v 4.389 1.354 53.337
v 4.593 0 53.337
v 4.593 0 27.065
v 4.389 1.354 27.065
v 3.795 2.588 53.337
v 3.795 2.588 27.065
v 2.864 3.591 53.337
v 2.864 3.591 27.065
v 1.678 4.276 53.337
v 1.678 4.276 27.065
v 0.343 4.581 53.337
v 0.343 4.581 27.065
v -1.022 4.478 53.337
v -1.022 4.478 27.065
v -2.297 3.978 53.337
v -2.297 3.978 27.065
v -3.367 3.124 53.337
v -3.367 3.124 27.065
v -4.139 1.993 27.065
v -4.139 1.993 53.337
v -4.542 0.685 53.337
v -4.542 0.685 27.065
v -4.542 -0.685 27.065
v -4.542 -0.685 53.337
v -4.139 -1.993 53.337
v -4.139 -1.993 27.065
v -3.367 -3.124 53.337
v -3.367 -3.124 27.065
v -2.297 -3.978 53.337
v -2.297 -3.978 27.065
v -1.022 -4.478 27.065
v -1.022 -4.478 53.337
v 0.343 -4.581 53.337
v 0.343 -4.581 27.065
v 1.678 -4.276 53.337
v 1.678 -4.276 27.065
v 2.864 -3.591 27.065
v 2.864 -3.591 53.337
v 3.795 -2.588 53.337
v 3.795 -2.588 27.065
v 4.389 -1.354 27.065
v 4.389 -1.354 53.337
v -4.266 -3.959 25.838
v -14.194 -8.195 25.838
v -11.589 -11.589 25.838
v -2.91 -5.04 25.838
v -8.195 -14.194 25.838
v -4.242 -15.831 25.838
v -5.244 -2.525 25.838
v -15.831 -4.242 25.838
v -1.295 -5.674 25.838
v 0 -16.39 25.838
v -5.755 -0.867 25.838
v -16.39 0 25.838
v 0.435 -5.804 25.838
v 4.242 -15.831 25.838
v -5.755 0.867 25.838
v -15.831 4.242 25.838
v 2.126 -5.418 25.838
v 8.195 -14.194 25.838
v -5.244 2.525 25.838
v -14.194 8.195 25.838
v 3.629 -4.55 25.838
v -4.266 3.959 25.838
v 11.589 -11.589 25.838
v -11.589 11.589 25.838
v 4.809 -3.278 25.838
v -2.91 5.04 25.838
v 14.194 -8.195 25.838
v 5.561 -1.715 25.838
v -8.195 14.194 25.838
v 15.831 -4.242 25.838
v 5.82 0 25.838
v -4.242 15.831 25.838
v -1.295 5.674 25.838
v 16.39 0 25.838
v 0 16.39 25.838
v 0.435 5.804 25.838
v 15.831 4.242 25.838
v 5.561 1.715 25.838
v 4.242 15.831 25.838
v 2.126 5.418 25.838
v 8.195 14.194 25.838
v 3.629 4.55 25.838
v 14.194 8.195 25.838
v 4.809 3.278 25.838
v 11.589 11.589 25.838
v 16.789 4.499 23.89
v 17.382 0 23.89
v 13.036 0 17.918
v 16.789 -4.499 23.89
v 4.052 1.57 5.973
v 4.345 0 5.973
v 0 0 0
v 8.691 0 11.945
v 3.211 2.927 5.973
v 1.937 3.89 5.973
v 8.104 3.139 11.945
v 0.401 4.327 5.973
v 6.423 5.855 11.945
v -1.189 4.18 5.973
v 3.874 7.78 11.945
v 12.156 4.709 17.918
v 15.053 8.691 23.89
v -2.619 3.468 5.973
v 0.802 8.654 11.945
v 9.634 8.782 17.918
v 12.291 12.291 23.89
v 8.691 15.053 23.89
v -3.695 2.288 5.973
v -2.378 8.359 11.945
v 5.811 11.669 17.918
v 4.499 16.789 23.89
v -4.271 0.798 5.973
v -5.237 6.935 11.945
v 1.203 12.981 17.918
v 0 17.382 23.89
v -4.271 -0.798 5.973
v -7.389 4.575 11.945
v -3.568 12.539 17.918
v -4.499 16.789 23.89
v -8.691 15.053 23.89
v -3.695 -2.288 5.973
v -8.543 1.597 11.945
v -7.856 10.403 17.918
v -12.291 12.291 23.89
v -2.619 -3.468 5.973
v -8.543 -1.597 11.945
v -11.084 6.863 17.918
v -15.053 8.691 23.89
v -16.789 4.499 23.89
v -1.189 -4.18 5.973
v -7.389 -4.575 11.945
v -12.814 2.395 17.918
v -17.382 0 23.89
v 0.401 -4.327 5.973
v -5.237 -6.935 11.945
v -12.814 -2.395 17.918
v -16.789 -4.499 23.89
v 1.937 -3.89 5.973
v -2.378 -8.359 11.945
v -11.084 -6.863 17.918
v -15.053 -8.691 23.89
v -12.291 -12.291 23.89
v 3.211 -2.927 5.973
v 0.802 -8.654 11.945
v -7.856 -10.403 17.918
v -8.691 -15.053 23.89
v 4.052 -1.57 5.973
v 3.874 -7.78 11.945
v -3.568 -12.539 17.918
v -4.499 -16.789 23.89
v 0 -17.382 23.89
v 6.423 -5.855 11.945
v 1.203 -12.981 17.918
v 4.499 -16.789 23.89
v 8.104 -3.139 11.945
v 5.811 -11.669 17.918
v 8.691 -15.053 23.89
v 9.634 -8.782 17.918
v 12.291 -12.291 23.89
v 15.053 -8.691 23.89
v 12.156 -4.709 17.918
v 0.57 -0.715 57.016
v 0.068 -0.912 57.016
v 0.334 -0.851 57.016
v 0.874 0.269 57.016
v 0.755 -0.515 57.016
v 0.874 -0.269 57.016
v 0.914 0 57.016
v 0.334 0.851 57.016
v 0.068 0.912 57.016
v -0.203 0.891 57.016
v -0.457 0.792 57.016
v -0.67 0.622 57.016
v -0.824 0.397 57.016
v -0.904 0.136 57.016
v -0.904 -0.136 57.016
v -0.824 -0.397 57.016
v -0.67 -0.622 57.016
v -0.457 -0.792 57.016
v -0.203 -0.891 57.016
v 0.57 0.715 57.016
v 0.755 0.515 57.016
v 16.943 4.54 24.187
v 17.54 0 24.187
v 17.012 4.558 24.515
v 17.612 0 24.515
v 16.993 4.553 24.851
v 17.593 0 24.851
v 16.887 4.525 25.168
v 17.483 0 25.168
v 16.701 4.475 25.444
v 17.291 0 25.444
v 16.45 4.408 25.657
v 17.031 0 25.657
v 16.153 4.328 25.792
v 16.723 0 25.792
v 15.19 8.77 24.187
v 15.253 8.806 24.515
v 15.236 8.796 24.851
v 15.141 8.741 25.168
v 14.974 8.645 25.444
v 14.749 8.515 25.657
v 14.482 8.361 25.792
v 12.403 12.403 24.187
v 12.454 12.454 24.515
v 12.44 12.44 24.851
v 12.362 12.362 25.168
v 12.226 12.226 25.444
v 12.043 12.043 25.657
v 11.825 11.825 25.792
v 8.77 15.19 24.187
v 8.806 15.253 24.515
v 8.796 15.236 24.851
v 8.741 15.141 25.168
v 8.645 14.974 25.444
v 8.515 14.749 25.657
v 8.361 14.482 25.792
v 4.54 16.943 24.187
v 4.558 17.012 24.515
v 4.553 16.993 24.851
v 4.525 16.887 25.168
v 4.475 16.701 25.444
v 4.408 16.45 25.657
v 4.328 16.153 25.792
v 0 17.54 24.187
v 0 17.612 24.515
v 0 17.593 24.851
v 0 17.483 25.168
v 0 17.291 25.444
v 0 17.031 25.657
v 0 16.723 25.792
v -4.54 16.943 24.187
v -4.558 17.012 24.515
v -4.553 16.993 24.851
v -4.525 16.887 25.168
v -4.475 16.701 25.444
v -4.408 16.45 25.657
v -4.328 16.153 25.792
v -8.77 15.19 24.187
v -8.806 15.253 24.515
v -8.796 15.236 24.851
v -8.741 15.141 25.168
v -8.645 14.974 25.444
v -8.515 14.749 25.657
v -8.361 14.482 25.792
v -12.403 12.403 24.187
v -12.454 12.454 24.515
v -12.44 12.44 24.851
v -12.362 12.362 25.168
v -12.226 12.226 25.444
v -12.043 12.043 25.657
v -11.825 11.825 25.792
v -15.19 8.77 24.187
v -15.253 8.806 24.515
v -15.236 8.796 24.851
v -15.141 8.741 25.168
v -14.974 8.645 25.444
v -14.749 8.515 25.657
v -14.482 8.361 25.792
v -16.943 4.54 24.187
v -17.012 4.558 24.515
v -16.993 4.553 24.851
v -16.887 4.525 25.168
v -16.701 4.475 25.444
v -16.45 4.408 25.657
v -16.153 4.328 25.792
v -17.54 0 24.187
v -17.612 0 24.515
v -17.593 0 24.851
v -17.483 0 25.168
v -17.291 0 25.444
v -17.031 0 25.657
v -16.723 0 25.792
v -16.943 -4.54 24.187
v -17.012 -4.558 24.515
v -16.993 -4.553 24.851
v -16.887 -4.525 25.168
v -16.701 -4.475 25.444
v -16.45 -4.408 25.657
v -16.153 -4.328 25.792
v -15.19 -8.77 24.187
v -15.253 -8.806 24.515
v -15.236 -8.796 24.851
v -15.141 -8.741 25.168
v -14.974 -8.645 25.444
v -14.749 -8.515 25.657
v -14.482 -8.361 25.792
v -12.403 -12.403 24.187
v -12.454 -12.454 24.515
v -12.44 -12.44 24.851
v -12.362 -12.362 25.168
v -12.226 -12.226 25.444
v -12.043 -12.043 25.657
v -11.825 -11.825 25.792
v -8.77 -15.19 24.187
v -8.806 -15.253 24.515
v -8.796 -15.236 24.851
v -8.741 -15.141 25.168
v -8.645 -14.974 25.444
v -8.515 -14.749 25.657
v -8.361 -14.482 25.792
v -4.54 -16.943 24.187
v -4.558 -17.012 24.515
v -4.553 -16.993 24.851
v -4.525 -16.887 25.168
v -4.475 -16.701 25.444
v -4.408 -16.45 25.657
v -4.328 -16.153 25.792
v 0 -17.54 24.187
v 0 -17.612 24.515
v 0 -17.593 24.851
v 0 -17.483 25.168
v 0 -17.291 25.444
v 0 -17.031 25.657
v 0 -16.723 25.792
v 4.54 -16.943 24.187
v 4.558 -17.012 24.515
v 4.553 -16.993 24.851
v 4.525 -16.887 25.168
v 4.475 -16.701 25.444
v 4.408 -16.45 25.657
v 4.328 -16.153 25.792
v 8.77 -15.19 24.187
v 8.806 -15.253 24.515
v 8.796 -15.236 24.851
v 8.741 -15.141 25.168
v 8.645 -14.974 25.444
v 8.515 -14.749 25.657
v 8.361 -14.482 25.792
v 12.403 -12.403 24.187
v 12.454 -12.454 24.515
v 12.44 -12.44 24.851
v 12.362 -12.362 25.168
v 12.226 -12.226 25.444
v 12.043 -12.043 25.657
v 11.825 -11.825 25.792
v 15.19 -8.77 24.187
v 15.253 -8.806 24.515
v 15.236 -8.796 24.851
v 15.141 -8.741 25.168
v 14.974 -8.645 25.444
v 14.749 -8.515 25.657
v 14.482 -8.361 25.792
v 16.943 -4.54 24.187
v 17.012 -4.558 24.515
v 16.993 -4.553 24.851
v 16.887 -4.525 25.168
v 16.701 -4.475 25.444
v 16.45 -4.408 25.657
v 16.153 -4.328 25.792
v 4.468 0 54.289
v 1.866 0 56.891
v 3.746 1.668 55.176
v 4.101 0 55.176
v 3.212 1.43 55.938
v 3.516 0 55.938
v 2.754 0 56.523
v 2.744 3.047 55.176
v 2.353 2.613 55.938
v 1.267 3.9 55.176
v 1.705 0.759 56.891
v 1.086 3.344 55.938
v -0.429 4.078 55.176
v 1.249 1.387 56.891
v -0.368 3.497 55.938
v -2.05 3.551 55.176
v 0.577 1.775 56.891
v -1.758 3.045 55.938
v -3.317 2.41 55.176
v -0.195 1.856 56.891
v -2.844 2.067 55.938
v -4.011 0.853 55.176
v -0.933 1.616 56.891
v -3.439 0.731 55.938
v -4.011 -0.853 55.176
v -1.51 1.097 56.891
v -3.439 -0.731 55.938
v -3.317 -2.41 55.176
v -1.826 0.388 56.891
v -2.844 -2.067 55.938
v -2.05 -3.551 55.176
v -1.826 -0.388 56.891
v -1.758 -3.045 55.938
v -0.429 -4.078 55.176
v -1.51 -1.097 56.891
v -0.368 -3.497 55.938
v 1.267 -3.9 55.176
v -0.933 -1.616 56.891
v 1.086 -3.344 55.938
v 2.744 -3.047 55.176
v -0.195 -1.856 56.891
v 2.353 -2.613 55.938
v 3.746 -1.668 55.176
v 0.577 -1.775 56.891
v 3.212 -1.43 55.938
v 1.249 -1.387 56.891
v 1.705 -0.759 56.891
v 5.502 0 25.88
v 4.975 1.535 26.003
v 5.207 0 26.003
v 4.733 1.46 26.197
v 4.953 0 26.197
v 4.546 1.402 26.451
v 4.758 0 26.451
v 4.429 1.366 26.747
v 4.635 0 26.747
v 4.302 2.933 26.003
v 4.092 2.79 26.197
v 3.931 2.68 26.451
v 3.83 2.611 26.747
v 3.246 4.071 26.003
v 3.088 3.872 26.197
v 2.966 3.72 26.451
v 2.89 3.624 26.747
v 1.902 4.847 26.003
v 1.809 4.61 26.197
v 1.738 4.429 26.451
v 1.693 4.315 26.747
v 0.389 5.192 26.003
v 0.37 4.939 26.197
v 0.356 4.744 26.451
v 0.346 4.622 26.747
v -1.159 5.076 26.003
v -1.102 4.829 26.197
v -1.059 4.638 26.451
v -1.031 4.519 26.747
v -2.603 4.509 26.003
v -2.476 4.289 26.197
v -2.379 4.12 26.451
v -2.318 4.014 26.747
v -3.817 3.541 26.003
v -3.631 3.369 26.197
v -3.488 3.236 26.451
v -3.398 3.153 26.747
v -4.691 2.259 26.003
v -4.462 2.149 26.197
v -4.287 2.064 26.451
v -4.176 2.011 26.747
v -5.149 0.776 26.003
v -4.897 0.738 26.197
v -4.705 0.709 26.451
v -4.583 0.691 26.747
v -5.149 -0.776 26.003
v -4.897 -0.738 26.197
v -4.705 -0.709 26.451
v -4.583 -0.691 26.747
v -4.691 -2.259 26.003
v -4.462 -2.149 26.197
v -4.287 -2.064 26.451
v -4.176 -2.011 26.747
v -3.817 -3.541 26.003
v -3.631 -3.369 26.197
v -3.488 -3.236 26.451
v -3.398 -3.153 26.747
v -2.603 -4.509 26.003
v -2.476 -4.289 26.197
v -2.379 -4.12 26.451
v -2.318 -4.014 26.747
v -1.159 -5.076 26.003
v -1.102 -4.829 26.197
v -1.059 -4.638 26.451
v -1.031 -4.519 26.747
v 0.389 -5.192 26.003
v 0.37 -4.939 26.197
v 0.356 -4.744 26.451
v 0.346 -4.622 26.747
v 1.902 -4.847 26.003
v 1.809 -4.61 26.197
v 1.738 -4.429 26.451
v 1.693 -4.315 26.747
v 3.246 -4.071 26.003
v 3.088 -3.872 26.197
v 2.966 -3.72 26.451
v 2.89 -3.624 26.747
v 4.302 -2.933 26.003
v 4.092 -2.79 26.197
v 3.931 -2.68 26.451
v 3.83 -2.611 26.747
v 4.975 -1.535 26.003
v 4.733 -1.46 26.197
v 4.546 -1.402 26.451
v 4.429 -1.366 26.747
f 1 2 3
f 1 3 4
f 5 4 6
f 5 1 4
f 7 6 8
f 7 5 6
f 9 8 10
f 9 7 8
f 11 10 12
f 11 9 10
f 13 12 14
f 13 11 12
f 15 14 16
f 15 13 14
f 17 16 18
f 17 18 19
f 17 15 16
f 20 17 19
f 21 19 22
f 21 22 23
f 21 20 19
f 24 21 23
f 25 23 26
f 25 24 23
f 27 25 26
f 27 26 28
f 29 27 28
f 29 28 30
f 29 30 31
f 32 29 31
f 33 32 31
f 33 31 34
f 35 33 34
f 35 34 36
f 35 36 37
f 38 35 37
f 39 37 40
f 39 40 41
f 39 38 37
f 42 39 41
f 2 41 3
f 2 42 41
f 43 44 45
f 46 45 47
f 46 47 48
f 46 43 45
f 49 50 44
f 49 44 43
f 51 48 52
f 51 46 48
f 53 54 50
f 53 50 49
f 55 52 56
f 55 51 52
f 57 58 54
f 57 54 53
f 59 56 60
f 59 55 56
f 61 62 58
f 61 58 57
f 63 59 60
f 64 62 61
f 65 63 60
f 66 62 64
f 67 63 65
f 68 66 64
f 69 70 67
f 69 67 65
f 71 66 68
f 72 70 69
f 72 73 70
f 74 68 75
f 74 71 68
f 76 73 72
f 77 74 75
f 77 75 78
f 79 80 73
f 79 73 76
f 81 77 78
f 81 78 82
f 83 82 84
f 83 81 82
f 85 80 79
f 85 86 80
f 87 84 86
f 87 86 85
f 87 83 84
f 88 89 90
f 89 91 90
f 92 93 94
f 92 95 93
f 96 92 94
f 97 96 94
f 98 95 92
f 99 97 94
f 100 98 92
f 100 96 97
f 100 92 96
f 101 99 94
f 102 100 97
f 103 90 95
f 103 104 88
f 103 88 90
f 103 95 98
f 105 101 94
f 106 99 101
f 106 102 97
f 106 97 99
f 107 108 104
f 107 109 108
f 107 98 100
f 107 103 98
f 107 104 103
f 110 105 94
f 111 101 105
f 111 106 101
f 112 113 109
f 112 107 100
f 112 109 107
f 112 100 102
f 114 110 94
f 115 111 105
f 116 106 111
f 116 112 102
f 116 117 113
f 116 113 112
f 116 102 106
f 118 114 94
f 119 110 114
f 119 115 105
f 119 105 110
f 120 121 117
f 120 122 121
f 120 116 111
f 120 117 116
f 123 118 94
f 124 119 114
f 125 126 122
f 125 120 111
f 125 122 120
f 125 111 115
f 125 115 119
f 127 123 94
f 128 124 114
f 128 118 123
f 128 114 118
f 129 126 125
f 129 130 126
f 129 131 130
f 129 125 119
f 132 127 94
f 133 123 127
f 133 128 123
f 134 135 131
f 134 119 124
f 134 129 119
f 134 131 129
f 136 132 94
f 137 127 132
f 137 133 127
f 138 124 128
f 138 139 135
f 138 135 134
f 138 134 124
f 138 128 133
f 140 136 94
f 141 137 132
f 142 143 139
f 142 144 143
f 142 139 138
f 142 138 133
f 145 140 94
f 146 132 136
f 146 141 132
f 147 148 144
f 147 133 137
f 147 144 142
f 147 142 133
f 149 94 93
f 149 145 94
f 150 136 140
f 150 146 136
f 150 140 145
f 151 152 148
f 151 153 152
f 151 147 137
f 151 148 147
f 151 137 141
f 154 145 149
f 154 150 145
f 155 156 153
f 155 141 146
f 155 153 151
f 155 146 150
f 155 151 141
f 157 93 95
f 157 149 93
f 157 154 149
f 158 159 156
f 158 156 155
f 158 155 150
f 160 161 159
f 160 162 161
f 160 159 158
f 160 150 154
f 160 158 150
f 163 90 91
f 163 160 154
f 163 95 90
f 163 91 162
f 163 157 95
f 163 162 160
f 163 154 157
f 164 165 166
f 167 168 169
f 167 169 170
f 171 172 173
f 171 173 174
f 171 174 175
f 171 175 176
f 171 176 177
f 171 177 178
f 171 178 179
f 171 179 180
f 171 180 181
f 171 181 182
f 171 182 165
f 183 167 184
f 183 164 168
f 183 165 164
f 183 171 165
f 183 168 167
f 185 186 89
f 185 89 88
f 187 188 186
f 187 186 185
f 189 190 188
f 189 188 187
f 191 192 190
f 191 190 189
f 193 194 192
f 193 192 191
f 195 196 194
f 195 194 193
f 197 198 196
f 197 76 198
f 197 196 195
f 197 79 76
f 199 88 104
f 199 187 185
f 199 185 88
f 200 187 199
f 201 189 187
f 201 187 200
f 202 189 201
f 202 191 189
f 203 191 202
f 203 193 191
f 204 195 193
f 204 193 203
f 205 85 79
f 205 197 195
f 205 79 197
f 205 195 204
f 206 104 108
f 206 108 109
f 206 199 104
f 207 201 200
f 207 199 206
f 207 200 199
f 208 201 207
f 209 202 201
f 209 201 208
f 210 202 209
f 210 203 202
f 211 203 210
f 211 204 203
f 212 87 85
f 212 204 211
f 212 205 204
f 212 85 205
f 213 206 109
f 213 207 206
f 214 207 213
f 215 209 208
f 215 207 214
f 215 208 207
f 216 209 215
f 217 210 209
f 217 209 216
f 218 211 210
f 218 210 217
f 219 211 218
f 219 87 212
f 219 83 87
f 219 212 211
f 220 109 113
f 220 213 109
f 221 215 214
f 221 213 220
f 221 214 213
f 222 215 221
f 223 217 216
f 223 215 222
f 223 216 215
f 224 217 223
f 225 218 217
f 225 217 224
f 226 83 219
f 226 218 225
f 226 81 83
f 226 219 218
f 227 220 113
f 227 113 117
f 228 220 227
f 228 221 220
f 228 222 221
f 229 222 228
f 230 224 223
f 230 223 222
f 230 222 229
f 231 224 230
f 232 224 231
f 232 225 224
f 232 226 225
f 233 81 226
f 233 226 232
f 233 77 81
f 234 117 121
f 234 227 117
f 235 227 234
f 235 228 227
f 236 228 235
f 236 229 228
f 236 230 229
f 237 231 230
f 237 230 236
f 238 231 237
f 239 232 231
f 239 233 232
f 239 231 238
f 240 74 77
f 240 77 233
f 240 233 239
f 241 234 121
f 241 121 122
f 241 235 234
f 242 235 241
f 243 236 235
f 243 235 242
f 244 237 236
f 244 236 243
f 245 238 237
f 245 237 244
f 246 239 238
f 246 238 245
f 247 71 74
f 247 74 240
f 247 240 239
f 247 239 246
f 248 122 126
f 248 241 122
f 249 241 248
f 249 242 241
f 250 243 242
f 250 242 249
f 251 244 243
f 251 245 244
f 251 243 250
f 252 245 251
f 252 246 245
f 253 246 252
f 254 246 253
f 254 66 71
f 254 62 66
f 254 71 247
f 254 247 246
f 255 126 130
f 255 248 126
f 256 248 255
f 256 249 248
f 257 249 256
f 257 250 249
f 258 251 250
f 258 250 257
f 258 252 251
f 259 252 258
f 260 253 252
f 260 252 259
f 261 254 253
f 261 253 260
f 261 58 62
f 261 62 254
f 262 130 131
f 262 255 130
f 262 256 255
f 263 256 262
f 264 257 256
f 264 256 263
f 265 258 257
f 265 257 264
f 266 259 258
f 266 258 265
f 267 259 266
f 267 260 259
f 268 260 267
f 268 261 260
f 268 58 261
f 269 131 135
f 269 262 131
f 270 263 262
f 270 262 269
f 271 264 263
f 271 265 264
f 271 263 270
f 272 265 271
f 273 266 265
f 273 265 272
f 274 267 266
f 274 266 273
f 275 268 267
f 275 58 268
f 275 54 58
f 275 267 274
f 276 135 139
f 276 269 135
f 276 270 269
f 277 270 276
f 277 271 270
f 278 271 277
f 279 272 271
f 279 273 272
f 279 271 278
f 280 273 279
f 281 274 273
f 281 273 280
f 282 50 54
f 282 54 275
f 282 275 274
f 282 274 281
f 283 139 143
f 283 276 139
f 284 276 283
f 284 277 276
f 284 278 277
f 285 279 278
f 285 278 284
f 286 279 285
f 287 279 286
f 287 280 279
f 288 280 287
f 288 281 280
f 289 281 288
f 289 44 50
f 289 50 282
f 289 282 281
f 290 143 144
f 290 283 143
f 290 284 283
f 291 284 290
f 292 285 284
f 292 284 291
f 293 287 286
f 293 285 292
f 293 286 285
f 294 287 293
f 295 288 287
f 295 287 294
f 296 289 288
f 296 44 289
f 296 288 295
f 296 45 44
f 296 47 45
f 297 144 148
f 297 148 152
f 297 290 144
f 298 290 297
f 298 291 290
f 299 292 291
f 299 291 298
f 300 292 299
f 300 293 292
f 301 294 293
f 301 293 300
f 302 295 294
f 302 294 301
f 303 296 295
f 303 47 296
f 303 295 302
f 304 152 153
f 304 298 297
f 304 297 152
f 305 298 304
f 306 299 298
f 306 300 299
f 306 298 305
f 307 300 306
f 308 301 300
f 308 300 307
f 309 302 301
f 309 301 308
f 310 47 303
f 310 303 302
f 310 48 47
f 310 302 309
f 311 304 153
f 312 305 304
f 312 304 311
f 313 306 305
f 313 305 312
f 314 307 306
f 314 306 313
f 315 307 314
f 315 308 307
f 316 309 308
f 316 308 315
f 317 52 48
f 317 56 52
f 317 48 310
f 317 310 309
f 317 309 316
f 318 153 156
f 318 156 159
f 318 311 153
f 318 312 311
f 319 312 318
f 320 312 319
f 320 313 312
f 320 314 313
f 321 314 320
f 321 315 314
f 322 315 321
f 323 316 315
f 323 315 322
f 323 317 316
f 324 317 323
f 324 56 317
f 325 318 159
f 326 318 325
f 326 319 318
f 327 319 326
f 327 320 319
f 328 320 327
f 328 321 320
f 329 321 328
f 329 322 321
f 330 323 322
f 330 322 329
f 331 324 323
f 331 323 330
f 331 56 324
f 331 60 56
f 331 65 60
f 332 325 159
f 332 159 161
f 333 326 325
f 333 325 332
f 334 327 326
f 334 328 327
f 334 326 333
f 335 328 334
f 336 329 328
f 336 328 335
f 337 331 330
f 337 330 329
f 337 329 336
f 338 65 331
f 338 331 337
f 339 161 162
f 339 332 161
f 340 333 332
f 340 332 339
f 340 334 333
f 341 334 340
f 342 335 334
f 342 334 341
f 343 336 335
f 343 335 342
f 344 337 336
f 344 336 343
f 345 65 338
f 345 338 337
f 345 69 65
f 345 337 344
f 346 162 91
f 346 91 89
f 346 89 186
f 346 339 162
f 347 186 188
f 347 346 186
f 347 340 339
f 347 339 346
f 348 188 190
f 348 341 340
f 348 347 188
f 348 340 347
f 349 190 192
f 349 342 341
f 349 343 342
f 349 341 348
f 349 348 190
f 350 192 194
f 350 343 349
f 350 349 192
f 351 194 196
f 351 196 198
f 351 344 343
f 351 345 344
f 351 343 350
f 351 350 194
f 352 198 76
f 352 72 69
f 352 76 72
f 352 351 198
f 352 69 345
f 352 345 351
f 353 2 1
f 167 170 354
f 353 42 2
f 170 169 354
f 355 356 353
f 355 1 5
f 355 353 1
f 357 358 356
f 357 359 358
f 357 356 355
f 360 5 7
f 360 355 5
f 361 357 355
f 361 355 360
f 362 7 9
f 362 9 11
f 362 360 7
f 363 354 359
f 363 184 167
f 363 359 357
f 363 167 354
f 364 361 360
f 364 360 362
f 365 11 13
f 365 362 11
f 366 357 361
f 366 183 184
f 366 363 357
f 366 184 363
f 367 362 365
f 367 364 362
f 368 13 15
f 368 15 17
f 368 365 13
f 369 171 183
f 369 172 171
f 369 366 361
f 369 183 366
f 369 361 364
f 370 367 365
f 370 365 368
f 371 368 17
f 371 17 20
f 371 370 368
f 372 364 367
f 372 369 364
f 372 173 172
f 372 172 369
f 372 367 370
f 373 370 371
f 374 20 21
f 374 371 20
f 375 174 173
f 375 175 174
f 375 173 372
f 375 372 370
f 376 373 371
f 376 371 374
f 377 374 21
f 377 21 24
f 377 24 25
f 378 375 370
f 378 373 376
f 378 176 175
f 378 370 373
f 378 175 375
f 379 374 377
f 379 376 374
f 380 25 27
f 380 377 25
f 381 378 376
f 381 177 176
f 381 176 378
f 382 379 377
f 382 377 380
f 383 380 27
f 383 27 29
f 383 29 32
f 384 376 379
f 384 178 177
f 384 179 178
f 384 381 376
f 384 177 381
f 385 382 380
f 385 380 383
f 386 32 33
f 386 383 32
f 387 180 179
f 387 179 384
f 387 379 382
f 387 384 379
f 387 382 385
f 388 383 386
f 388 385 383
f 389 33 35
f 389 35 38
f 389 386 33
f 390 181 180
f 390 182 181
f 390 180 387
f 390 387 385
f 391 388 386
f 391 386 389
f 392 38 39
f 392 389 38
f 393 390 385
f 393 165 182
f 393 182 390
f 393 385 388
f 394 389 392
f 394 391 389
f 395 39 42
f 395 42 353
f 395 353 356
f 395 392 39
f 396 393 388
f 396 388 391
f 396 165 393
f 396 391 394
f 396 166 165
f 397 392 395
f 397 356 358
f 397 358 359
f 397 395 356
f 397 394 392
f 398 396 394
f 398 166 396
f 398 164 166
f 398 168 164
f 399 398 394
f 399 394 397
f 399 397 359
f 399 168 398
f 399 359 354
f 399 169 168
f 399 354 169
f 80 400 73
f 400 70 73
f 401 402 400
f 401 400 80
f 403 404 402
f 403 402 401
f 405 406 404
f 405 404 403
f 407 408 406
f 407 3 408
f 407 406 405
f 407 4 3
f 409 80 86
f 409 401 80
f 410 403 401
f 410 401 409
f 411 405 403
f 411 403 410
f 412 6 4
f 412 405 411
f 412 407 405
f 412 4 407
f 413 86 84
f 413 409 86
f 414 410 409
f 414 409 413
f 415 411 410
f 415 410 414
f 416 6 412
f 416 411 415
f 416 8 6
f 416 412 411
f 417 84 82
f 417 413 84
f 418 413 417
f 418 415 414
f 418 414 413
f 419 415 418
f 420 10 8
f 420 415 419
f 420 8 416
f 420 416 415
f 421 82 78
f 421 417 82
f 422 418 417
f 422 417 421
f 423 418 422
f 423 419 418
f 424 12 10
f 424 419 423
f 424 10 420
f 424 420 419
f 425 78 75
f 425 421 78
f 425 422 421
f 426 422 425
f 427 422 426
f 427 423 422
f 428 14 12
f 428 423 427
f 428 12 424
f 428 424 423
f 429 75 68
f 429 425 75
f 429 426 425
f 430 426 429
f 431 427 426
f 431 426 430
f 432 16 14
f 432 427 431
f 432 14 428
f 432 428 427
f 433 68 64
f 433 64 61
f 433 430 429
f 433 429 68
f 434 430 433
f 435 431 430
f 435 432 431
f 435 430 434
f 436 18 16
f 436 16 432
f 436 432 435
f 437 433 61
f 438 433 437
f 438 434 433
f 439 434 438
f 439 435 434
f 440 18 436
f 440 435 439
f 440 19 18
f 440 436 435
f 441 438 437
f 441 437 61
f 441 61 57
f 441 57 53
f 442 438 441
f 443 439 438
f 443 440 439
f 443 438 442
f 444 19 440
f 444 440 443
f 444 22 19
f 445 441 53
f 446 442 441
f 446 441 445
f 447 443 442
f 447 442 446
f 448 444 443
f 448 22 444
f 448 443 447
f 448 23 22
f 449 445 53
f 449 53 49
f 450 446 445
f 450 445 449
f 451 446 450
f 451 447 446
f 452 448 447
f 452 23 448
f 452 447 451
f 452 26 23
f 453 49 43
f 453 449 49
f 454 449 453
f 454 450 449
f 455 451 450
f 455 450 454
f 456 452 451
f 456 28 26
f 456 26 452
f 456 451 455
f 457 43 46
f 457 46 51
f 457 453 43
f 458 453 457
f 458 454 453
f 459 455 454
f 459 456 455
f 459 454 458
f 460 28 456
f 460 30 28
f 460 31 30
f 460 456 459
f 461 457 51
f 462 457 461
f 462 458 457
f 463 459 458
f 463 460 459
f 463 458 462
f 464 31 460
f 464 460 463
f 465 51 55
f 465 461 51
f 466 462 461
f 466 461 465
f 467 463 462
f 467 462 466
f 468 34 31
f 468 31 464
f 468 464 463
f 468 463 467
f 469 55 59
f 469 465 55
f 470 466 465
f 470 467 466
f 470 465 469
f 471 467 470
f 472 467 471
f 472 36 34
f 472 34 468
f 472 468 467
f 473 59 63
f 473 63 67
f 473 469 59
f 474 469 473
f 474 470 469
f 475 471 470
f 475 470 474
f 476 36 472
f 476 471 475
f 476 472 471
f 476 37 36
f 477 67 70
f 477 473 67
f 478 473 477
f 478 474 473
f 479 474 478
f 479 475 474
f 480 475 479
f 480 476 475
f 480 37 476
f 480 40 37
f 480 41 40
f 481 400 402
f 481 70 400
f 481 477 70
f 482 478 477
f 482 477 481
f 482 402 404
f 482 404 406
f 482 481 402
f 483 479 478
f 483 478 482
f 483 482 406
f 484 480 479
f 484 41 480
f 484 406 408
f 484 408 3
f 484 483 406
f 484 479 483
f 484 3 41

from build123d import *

# Parameters (mm, degrees)
F2_R = 1.22642
F3_R = 3.679261


with BuildPart() as f1:
    # F0 (on Front) → F1 (revolve)
    with BuildSketch(Plane.XZ):
        Polygon((0, 57.015903), (0, 0), (18.798783, 25.838224), (4.593469, 25.838224), (4.593469, 57.015903), align=None)
    revolve(axis=Axis((0, 0, 28.507952), (0, 0, 1)))

    # F2
    f2_edges = [f1.edges().sort_by_distance(p)[0] for p in [
        (-18.798783, 0, 25.838224),
        (-4.593469, 0, 25.838224),
    ]]
    fillet(f2_edges, radius=F2_R)

    # F3
    f3_edges = [f1.edges().sort_by_distance(p)[0] for p in [
        (-4.593469, 0, 57.015903),
    ]]
    fillet(f3_edges, radius=F3_R)


solid = f1.part
